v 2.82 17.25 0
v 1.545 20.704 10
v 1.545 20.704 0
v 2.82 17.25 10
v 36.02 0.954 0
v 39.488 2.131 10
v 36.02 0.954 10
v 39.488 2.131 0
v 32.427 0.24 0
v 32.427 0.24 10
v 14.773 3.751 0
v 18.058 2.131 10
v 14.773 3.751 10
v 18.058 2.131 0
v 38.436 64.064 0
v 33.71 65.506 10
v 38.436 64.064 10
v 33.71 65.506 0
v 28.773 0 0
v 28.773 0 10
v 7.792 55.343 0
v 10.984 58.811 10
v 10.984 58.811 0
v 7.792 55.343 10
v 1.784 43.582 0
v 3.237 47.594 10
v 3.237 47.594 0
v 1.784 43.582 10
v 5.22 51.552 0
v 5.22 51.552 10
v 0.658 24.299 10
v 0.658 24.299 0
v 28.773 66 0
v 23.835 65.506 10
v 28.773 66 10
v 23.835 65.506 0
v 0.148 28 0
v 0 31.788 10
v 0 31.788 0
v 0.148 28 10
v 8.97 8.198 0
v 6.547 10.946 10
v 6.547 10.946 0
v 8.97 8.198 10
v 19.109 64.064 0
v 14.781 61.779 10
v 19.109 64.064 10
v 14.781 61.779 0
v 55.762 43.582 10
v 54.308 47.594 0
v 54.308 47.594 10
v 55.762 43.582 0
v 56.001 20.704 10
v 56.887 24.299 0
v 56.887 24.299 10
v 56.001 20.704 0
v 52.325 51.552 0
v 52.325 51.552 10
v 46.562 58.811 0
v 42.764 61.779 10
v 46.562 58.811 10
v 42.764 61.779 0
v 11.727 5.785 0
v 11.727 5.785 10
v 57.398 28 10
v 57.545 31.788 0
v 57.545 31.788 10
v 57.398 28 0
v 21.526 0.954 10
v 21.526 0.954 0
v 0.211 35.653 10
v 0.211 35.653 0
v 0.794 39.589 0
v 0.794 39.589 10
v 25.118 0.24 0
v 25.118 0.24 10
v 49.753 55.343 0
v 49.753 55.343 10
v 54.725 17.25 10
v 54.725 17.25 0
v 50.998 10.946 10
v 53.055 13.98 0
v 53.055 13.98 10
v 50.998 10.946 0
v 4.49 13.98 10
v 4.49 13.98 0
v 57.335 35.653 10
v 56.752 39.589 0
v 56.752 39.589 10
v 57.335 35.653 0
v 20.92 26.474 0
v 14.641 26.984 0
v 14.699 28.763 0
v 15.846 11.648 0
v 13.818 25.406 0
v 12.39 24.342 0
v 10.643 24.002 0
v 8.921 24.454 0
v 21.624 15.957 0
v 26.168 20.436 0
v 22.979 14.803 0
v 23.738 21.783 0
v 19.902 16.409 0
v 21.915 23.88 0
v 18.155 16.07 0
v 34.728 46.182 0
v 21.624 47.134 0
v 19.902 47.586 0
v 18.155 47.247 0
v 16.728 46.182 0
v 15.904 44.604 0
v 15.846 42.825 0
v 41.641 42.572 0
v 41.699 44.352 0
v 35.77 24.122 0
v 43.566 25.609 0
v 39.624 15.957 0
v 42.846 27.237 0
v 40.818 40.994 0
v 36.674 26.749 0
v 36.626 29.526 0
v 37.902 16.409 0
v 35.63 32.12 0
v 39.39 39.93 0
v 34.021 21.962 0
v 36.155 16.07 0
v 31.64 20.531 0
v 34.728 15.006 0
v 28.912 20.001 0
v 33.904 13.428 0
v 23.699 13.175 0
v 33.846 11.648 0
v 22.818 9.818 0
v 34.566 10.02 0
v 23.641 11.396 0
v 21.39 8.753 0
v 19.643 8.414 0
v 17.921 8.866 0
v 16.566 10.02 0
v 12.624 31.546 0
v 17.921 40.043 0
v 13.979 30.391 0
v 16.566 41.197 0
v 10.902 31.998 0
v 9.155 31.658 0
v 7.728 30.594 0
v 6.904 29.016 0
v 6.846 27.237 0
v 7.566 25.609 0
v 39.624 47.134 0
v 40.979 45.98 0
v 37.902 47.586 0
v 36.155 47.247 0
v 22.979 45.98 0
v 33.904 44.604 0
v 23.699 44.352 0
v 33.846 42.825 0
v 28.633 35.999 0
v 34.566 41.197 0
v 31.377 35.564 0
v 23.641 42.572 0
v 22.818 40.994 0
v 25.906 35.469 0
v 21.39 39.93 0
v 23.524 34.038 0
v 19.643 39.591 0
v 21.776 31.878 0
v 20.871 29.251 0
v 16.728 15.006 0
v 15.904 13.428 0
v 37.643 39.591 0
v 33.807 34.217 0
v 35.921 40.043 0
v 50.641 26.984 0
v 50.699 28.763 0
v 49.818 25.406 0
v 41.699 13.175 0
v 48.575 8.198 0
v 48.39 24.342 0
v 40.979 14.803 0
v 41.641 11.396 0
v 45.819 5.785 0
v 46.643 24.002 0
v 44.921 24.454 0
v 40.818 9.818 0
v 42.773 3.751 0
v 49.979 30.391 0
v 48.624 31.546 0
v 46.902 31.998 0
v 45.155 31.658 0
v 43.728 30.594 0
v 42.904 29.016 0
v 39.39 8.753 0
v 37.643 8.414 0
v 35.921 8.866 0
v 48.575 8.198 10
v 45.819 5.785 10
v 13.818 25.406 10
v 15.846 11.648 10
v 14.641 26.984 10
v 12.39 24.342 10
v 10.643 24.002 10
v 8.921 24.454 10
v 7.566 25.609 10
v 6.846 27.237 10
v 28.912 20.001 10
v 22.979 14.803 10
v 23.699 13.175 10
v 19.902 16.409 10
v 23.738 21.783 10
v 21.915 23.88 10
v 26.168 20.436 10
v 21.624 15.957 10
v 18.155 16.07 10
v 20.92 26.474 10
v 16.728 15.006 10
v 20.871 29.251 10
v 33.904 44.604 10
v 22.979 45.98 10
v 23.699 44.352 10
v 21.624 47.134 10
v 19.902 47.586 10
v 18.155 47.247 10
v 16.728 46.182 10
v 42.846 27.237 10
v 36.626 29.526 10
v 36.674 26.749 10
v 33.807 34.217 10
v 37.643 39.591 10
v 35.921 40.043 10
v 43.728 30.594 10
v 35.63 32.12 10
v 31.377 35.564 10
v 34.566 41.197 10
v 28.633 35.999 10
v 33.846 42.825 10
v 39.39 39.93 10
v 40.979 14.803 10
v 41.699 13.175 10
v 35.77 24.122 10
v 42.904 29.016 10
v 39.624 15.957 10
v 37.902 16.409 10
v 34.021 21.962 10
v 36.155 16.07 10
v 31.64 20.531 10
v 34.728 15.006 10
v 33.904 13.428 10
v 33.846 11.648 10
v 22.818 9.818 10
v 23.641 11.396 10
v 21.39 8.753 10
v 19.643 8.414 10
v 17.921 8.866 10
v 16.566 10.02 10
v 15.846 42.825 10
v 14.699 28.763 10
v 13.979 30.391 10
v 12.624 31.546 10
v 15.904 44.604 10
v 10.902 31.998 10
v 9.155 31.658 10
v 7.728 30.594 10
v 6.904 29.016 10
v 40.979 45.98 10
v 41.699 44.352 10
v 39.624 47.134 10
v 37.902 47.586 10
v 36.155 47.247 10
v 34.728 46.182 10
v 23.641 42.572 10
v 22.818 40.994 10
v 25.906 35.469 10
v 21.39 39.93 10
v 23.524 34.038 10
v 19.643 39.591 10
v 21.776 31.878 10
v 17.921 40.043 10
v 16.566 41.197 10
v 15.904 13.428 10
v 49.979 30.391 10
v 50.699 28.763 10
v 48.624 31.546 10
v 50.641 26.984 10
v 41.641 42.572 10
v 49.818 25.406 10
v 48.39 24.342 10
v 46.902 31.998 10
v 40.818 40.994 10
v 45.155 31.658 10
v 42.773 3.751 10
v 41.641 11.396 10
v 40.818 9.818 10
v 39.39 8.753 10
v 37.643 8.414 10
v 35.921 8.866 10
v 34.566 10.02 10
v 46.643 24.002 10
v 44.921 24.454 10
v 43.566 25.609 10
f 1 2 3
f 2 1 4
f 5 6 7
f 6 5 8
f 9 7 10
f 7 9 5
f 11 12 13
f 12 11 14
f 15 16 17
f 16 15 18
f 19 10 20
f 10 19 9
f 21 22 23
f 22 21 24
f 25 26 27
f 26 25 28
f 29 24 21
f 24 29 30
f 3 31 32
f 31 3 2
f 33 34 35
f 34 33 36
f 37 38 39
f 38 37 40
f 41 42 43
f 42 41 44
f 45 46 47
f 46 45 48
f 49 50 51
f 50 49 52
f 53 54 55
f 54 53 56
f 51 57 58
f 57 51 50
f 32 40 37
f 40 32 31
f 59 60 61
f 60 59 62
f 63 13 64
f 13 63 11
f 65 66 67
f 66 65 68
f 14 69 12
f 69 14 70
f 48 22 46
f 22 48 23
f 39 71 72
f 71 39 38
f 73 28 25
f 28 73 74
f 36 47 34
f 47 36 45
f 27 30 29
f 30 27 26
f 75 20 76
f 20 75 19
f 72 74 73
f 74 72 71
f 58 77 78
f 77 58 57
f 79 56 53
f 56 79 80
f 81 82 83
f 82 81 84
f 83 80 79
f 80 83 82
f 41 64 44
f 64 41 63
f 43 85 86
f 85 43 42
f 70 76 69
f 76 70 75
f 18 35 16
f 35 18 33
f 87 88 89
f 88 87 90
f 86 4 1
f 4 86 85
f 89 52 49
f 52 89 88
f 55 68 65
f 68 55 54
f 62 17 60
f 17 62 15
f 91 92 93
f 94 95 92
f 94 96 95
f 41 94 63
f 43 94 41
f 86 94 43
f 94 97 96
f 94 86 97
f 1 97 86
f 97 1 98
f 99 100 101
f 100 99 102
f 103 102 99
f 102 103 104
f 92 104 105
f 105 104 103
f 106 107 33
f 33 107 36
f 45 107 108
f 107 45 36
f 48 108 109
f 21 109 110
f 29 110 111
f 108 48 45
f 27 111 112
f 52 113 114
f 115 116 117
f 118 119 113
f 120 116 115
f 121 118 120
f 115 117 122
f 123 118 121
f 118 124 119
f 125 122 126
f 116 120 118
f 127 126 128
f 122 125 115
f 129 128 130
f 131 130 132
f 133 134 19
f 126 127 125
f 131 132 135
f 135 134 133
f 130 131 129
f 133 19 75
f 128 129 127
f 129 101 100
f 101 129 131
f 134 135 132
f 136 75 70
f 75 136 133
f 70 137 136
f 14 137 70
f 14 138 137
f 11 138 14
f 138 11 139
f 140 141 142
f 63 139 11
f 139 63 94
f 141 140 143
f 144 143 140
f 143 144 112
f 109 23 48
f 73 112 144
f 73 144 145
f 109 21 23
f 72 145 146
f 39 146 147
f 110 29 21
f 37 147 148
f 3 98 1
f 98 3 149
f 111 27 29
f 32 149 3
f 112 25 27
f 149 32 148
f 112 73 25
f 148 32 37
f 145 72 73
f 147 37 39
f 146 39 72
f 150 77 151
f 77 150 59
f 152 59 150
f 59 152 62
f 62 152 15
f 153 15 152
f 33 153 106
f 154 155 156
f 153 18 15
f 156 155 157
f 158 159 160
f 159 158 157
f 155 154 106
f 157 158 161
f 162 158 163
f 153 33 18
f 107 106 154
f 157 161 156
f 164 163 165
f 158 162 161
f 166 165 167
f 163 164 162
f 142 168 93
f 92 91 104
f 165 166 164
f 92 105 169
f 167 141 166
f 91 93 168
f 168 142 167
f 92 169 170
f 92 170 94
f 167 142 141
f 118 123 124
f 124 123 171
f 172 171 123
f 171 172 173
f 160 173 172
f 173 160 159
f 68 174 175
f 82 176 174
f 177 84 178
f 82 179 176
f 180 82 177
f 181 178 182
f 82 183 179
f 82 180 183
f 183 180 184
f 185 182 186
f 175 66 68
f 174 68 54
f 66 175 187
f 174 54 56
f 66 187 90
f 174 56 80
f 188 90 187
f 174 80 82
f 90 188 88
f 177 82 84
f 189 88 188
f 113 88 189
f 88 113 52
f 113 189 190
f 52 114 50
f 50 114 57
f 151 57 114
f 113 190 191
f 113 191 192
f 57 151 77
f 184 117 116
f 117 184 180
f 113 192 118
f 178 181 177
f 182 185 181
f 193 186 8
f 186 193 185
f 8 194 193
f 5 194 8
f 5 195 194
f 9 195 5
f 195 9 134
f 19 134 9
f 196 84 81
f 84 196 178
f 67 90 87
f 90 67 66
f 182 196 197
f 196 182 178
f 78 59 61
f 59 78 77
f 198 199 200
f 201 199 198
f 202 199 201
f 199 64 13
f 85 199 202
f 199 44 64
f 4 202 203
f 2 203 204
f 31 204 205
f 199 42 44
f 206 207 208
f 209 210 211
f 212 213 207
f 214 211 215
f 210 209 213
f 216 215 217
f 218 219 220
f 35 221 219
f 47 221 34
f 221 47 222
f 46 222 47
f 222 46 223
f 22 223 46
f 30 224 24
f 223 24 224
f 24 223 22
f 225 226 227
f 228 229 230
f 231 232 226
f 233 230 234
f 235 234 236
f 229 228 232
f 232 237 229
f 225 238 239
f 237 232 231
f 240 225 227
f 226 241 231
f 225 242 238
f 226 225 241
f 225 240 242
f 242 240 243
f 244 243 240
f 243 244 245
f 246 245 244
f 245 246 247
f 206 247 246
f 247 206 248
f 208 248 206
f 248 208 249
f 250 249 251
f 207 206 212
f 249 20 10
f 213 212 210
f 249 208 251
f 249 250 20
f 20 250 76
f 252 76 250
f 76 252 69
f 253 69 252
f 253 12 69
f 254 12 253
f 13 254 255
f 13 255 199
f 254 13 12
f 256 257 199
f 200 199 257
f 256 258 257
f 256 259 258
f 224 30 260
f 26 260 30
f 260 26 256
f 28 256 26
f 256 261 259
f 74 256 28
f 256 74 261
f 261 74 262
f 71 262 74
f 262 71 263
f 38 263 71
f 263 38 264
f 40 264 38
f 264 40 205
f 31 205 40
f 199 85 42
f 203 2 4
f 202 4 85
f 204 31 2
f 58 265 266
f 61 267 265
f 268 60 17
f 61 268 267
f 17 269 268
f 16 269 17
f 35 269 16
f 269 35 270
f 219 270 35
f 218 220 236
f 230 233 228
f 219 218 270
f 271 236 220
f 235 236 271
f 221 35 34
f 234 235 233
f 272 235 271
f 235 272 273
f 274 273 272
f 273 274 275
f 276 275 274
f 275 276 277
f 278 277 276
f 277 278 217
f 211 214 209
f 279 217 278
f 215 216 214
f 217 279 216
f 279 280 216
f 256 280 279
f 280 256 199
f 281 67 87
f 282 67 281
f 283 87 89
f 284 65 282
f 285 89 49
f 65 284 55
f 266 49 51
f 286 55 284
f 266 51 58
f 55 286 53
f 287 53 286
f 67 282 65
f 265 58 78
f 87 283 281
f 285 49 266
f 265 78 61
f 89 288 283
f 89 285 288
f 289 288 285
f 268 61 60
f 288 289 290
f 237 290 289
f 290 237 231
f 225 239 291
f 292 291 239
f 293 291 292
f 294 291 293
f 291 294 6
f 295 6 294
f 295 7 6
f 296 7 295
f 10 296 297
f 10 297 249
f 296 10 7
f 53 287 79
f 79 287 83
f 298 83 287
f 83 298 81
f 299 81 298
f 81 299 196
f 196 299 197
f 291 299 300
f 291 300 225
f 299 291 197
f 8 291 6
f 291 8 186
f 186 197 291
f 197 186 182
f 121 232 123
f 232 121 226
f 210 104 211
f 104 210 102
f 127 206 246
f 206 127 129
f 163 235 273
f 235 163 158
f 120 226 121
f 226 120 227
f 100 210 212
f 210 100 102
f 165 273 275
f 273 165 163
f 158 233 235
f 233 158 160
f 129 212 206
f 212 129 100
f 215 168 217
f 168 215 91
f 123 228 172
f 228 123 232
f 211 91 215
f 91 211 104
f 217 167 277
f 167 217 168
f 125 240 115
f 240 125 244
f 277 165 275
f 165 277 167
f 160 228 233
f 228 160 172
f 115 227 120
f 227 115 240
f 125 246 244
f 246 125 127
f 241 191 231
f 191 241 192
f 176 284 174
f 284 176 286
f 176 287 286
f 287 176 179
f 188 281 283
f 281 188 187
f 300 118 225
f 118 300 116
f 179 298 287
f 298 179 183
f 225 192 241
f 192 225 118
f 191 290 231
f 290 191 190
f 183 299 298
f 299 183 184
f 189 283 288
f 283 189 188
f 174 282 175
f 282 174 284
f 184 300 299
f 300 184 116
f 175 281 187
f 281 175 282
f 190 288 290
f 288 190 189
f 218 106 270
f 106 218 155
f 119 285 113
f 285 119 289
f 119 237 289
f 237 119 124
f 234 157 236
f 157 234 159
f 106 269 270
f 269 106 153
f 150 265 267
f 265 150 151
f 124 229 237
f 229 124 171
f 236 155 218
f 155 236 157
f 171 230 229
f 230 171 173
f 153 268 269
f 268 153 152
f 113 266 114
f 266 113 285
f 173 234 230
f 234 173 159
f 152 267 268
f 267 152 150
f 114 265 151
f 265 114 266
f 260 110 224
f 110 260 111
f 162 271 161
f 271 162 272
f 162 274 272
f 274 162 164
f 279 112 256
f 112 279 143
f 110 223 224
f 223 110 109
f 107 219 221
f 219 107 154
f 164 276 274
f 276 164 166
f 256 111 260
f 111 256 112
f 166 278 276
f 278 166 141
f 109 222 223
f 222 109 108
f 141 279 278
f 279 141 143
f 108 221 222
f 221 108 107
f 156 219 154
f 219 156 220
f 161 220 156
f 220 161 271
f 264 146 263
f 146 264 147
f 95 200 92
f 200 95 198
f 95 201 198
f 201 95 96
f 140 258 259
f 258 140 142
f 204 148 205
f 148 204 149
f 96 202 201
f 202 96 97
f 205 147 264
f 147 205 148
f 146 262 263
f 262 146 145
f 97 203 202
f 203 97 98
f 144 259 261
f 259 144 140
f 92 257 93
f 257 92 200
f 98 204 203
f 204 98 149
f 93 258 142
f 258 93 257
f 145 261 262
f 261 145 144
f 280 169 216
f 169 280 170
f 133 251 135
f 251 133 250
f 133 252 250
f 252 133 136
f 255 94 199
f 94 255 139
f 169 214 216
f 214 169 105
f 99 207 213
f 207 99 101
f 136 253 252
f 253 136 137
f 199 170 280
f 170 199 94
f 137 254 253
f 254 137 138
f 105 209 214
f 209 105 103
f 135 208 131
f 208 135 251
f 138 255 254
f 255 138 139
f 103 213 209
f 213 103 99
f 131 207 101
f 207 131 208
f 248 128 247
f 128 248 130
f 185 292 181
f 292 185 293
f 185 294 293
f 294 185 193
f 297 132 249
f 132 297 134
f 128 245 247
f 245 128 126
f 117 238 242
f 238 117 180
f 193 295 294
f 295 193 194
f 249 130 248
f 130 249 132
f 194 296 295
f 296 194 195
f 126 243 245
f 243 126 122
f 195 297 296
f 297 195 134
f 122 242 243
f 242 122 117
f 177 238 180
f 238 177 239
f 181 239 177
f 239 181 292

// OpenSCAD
$fn = 32;

// ----------------------------------------------------------------------
// Cam plate: single_lobe cam, base R28
// ----------------------------------------------------------------------

// --- parameters (mm) ---
base_r = 28;              // base circle radius
lobe_h = 10;              // cam lobe rise
bore_r = 8;               // shaft bore radius
plate_t = 10;             // plate thickness, Z (extrusion height)
ring_r = 18;              // lightening ring radius
bolt_r = 4;               // lightening hole radius

profile = [[57.398, 28], [57.545, 31.788], [57.335, 35.653], [56.752, 39.589], [55.762, 43.582], [54.308, 47.594], [52.325, 51.552], [49.753, 55.343], [46.562, 58.811], [42.764, 61.779], [38.436, 64.064], [33.71, 65.506], [28.773, 66], [23.835, 65.506], [19.109, 64.064], [14.781, 61.779], [10.984, 58.811], [7.792, 55.343], [5.22, 51.552], [3.237, 47.594], [1.784, 43.582], [0.794, 39.589], [0.211, 35.653], [0, 31.788], [0.148, 28], [0.658, 24.299], [1.545, 20.704], [2.82, 17.25], [4.49, 13.98], [6.547, 10.946], [8.97, 8.198], [11.727, 5.785], [14.773, 3.751], [18.058, 2.131], [21.526, 0.954], [25.118, 0.24], [28.773, 0], [32.427, 0.24], [36.02, 0.954], [39.488, 2.131], [42.773, 3.751], [45.819, 5.785], [48.575, 8.198], [50.998, 10.946], [53.055, 13.98], [54.725, 17.25], [56.001, 20.704], [56.887, 24.299]];  // primary outline, 48 points, counter clockwise
void_1 = [[36.626, 29.526], [35.63, 32.12], [33.807, 34.217], [31.377, 35.564], [28.633, 35.999], [25.906, 35.469], [23.524, 34.038], [21.776, 31.878], [20.871, 29.251], [20.92, 26.474], [21.915, 23.88], [23.738, 21.783], [26.168, 20.436], [28.912, 20.001], [31.64, 20.531], [34.021, 21.962], [35.77, 24.122], [36.674, 26.749]];  // shaft bore, 18 points
void_2 = [[50.699, 28.763], [49.979, 30.391], [48.624, 31.546], [46.902, 31.998], [45.155, 31.658], [43.728, 30.594], [42.904, 29.016], [42.846, 27.237], [43.566, 25.609], [44.921, 24.454], [46.643, 24.002], [48.39, 24.342], [49.818, 25.406], [50.641, 26.984]];  // lightening hole 1, 14 points
void_3 = [[41.699, 44.352], [40.979, 45.98], [39.624, 47.134], [37.902, 47.586], [36.155, 47.247], [34.728, 46.182], [33.904, 44.604], [33.846, 42.825], [34.566, 41.197], [35.921, 40.043], [37.643, 39.591], [39.39, 39.93], [40.818, 40.994], [41.641, 42.572]];  // lightening hole 2, 14 points
void_4 = [[23.699, 44.352], [22.979, 45.98], [21.624, 47.134], [19.902, 47.586], [18.155, 47.247], [16.728, 46.182], [15.904, 44.604], [15.846, 42.825], [16.566, 41.197], [17.921, 40.043], [19.643, 39.591], [21.39, 39.93], [22.818, 40.994], [23.641, 42.572]];  // lightening hole 3, 14 points
void_5 = [[14.699, 28.763], [13.979, 30.391], [12.624, 31.546], [10.902, 31.998], [9.155, 31.658], [7.728, 30.594], [6.904, 29.016], [6.846, 27.237], [7.566, 25.609], [8.921, 24.454], [10.643, 24.002], [12.39, 24.342], [13.818, 25.406], [14.641, 26.984]];  // lightening hole 4, 14 points
void_6 = [[23.699, 13.175], [22.979, 14.803], [21.624, 15.957], [19.902, 16.409], [18.155, 16.07], [16.728, 15.006], [15.904, 13.428], [15.846, 11.648], [16.566, 10.02], [17.921, 8.866], [19.643, 8.414], [21.39, 8.753], [22.818, 9.818], [23.641, 11.396]];  // lightening hole 5, 14 points
void_7 = [[41.699, 13.175], [40.979, 14.803], [39.624, 15.957], [37.902, 16.409], [36.155, 16.07], [34.728, 15.006], [33.904, 13.428], [33.846, 11.648], [34.566, 10.02], [35.921, 8.866], [37.643, 8.414], [39.39, 8.753], [40.818, 9.818], [41.641, 11.396]];  // lightening hole 6, 14 points

// --- the one profile operation ---
difference() {
  linear_extrude(height = plate_t) polygon(points = profile);
  translate([0, 0, -1])
    linear_extrude(height = plate_t + 2) polygon(points = void_1);
  translate([0, 0, -1])
    linear_extrude(height = plate_t + 2) polygon(points = void_2);
  translate([0, 0, -1])
    linear_extrude(height = plate_t + 2) polygon(points = void_3);
  translate([0, 0, -1])
    linear_extrude(height = plate_t + 2) polygon(points = void_4);
  translate([0, 0, -1])
    linear_extrude(height = plate_t + 2) polygon(points = void_5);
  translate([0, 0, -1])
    linear_extrude(height = plate_t + 2) polygon(points = void_6);
  translate([0, 0, -1])
    linear_extrude(height = plate_t + 2) polygon(points = void_7);
}
